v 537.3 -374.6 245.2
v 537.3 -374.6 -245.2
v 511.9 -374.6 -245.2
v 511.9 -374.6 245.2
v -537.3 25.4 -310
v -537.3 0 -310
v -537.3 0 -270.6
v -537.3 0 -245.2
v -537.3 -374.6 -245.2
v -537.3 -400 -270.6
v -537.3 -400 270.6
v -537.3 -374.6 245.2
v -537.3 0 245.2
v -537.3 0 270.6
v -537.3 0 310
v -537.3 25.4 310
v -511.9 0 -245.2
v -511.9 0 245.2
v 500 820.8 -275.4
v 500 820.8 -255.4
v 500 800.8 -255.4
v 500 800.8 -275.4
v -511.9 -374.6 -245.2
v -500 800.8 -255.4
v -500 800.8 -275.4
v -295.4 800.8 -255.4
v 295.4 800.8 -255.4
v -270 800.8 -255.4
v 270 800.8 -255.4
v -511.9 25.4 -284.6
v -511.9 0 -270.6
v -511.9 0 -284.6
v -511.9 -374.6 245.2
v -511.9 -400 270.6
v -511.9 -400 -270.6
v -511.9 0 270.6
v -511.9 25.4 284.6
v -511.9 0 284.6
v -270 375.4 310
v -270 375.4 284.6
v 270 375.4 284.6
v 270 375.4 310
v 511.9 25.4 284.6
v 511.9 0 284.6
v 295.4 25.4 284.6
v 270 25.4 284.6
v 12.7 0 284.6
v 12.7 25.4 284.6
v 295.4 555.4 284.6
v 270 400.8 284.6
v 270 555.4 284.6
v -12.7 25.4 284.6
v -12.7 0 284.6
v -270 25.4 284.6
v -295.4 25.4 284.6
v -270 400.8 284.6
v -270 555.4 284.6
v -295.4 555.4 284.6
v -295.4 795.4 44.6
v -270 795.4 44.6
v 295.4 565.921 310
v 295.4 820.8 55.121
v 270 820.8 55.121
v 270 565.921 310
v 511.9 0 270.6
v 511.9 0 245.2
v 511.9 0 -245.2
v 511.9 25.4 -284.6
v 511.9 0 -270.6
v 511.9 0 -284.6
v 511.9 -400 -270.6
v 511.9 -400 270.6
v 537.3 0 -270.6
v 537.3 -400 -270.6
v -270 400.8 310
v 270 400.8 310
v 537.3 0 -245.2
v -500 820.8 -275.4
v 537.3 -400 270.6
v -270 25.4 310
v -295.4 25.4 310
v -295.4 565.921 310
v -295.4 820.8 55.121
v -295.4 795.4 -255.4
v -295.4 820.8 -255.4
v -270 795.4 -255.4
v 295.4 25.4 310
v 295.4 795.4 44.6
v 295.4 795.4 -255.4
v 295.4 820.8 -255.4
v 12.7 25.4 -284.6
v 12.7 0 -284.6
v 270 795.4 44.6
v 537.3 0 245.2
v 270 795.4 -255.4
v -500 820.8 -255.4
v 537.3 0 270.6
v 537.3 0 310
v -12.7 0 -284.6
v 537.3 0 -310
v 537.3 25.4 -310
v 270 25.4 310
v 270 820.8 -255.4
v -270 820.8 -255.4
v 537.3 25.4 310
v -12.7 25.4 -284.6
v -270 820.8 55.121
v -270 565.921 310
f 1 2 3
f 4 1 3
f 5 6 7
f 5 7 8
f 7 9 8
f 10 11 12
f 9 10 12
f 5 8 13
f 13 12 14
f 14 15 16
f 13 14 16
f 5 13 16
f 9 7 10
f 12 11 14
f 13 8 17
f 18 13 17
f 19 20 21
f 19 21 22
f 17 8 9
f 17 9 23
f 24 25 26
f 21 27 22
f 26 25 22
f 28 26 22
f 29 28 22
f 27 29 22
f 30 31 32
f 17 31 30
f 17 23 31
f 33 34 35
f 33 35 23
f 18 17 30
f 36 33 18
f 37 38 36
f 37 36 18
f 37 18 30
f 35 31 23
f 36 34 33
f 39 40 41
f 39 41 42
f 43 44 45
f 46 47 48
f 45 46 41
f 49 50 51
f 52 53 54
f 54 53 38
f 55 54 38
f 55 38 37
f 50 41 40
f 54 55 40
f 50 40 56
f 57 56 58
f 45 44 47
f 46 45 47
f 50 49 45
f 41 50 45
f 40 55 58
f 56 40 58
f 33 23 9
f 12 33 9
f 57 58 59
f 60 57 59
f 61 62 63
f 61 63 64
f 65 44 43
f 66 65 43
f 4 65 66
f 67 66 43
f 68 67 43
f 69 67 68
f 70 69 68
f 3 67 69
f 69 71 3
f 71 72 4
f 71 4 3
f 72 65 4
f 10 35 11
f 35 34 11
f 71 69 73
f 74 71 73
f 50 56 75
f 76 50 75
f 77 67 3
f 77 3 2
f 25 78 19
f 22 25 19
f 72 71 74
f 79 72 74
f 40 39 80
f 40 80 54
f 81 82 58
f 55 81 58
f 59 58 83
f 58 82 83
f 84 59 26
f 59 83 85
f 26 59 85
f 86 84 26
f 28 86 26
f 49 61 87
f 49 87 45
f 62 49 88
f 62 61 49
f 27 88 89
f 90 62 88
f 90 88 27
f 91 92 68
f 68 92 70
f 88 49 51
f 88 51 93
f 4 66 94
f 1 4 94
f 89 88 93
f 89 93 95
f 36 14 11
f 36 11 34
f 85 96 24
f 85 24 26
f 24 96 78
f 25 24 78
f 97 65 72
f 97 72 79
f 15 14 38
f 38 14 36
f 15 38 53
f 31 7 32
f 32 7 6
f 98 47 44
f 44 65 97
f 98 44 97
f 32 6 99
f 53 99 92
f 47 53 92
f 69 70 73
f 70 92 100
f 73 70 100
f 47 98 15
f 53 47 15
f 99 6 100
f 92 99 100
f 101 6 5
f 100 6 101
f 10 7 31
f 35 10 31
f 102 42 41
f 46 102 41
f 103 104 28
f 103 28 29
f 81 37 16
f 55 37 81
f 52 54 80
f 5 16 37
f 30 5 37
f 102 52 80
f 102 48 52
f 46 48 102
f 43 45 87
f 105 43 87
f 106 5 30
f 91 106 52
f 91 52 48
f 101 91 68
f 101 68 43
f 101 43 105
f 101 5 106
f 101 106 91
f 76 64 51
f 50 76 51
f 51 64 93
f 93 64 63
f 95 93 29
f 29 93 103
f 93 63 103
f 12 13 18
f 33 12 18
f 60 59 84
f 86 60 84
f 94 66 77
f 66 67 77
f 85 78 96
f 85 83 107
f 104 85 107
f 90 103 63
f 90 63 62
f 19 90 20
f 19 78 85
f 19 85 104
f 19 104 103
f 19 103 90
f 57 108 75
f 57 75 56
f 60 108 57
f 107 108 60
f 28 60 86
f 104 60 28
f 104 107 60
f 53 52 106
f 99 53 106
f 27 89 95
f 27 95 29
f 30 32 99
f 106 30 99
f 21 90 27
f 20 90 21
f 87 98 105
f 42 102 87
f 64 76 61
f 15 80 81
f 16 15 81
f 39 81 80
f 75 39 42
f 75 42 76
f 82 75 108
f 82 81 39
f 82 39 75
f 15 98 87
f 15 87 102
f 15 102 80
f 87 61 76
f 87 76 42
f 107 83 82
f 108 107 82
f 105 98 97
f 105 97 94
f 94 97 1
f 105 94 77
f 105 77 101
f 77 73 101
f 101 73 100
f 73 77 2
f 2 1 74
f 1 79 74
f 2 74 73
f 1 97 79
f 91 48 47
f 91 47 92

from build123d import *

# Parameters (mm, degrees)
SKETCH1_W           = 1074.6
SKETCH1_H           = 620
SKETCH1_W_2         = 1023.8
SKETCH1_H_2         = 569.2
BOSS_EXTRUDE1_DEPTH = 25.4
SKETCH2_W           = 25.4
SKETCH2_H           = 25.4
BOSS_EXTRUDE2_DEPTH = 400
SKETCH3_W           = 25.4
SKETCH3_H           = 25.4
BOSS_EXTRUDE3_DEPTH = 490.4
SKETCH5_W           = 25.4
SKETCH5_H           = 25.4
BOSS_EXTRUDE5_DEPTH = 50
SKETCH4_W           = 25.4
SKETCH4_H           = 569.2
BOSS_EXTRUDE6_DEPTH = 25.4
BOSS_EXTRUDE7_DEPTH = 25.4
SKETCH9_W           = 25.4
SKETCH9_H           = 25.4
BOSS_EXTRUDE8_DEPTH = 270
SKETCH10_W          = 1000
SKETCH10_H          = 20
BOSS_EXTRUDE9_DEPTH = 20


with BuildPart() as part:
    # Sketch1 → Boss-Extrude1 (new body)
    with BuildSketch(Plane(origin=(0, 0, 0), x_dir=(1, 0, 0), z_dir=(0, 1, 0))):
        Rectangle(SKETCH1_W, SKETCH1_H)
        Rectangle(SKETCH1_W_2, SKETCH1_H_2, mode=Mode.SUBTRACT)
    extrude(amount=BOSS_EXTRUDE1_DEPTH)

    # Sketch2 → Boss-Extrude2 (add)
    with BuildSketch(Plane.XZ):
        with Locations((-524.6, 257.9)):
            Rectangle(SKETCH2_W, SKETCH2_H)
        with Locations((-524.6, -257.9)):
            Rectangle(SKETCH2_W, SKETCH2_H)
        with Locations((524.6, 257.9)):
            Rectangle(SKETCH2_W, SKETCH2_H)
        with Locations((524.6, -257.9)):
            Rectangle(SKETCH2_W, SKETCH2_H)
    extrude(amount=BOSS_EXTRUDE2_DEPTH)

    # Sketch3 → Boss-Extrude3 (add)
    with BuildSketch(Plane(origin=(0, 0, 245.2), x_dir=(-1, 0, 0), z_dir=(0, 0, -1))):
        with Locations((524.6, -387.3)):
            Rectangle(SKETCH3_W, SKETCH3_H)
        with Locations((-524.6, -387.3)):
            Rectangle(SKETCH3_W, SKETCH3_H)
    extrude(amount=BOSS_EXTRUDE3_DEPTH)

    # Sketch5 → Boss-Extrude5 (add)
    with BuildSketch(Plane(origin=(0, 25.4, 0), x_dir=(1, 0, 0), z_dir=(0, 1, 0))):
        with Locations((282.7, -297.3)):
            Rectangle(SKETCH5_W, SKETCH5_H)
    boss_extrude5 = extrude(amount=BOSS_EXTRUDE5_DEPTH)

    # Sketch4 → Boss-Extrude6 (add)
    with BuildSketch(Plane(origin=(0, 25.4, 0), x_dir=(1, 0, 0), z_dir=(0, 1, 0))):
        Rectangle(SKETCH4_W, SKETCH4_H)
    extrude(amount=-BOSS_EXTRUDE6_DEPTH)

    # Sketch8 → Boss-Extrude7 (add)
    with BuildSketch(Plane(origin=(295.4, 0, 0), x_dir=(0, 0, -1), z_dir=(1, 0, 0))):
        Polygon((-284.6, 75.4), (-284.6, 555.4), (-44.6, 795.4), (255.4, 795.4), (255.4, 820.8), (-55.121024484, 820.8), (-310, 565.921024484), (-310, 75.4), align=None)
    boss_extrude7 = extrude(amount=-BOSS_EXTRUDE7_DEPTH)

    # Sketch9 → Boss-Extrude8 (add)
    with BuildSketch(Plane.ZY.offset(-270)):
        with Locations((297.3, 388.1)):
            Rectangle(SKETCH9_W, SKETCH9_H)
    boss_extrude8 = extrude(amount=BOSS_EXTRUDE8_DEPTH)

    # Mirror1: Boss-Extrude5, Boss-Extrude7, Boss-Extrude8 across plane
    add(boss_extrude5.mirror(Plane.ZY))
    add(boss_extrude7.mirror(Plane.ZY))
    add(boss_extrude8.mirror(Plane.ZY))

    # Sketch10 → Boss-Extrude9 (add)
    with BuildSketch(Plane(origin=(0, 820.8, 0), x_dir=(1, 0, 0), z_dir=(0, 1, 0))):
        with Locations((0, 265.4)):
            Rectangle(SKETCH10_W, SKETCH10_H)
    extrude(amount=-BOSS_EXTRUDE9_DEPTH)


solid = part.part
